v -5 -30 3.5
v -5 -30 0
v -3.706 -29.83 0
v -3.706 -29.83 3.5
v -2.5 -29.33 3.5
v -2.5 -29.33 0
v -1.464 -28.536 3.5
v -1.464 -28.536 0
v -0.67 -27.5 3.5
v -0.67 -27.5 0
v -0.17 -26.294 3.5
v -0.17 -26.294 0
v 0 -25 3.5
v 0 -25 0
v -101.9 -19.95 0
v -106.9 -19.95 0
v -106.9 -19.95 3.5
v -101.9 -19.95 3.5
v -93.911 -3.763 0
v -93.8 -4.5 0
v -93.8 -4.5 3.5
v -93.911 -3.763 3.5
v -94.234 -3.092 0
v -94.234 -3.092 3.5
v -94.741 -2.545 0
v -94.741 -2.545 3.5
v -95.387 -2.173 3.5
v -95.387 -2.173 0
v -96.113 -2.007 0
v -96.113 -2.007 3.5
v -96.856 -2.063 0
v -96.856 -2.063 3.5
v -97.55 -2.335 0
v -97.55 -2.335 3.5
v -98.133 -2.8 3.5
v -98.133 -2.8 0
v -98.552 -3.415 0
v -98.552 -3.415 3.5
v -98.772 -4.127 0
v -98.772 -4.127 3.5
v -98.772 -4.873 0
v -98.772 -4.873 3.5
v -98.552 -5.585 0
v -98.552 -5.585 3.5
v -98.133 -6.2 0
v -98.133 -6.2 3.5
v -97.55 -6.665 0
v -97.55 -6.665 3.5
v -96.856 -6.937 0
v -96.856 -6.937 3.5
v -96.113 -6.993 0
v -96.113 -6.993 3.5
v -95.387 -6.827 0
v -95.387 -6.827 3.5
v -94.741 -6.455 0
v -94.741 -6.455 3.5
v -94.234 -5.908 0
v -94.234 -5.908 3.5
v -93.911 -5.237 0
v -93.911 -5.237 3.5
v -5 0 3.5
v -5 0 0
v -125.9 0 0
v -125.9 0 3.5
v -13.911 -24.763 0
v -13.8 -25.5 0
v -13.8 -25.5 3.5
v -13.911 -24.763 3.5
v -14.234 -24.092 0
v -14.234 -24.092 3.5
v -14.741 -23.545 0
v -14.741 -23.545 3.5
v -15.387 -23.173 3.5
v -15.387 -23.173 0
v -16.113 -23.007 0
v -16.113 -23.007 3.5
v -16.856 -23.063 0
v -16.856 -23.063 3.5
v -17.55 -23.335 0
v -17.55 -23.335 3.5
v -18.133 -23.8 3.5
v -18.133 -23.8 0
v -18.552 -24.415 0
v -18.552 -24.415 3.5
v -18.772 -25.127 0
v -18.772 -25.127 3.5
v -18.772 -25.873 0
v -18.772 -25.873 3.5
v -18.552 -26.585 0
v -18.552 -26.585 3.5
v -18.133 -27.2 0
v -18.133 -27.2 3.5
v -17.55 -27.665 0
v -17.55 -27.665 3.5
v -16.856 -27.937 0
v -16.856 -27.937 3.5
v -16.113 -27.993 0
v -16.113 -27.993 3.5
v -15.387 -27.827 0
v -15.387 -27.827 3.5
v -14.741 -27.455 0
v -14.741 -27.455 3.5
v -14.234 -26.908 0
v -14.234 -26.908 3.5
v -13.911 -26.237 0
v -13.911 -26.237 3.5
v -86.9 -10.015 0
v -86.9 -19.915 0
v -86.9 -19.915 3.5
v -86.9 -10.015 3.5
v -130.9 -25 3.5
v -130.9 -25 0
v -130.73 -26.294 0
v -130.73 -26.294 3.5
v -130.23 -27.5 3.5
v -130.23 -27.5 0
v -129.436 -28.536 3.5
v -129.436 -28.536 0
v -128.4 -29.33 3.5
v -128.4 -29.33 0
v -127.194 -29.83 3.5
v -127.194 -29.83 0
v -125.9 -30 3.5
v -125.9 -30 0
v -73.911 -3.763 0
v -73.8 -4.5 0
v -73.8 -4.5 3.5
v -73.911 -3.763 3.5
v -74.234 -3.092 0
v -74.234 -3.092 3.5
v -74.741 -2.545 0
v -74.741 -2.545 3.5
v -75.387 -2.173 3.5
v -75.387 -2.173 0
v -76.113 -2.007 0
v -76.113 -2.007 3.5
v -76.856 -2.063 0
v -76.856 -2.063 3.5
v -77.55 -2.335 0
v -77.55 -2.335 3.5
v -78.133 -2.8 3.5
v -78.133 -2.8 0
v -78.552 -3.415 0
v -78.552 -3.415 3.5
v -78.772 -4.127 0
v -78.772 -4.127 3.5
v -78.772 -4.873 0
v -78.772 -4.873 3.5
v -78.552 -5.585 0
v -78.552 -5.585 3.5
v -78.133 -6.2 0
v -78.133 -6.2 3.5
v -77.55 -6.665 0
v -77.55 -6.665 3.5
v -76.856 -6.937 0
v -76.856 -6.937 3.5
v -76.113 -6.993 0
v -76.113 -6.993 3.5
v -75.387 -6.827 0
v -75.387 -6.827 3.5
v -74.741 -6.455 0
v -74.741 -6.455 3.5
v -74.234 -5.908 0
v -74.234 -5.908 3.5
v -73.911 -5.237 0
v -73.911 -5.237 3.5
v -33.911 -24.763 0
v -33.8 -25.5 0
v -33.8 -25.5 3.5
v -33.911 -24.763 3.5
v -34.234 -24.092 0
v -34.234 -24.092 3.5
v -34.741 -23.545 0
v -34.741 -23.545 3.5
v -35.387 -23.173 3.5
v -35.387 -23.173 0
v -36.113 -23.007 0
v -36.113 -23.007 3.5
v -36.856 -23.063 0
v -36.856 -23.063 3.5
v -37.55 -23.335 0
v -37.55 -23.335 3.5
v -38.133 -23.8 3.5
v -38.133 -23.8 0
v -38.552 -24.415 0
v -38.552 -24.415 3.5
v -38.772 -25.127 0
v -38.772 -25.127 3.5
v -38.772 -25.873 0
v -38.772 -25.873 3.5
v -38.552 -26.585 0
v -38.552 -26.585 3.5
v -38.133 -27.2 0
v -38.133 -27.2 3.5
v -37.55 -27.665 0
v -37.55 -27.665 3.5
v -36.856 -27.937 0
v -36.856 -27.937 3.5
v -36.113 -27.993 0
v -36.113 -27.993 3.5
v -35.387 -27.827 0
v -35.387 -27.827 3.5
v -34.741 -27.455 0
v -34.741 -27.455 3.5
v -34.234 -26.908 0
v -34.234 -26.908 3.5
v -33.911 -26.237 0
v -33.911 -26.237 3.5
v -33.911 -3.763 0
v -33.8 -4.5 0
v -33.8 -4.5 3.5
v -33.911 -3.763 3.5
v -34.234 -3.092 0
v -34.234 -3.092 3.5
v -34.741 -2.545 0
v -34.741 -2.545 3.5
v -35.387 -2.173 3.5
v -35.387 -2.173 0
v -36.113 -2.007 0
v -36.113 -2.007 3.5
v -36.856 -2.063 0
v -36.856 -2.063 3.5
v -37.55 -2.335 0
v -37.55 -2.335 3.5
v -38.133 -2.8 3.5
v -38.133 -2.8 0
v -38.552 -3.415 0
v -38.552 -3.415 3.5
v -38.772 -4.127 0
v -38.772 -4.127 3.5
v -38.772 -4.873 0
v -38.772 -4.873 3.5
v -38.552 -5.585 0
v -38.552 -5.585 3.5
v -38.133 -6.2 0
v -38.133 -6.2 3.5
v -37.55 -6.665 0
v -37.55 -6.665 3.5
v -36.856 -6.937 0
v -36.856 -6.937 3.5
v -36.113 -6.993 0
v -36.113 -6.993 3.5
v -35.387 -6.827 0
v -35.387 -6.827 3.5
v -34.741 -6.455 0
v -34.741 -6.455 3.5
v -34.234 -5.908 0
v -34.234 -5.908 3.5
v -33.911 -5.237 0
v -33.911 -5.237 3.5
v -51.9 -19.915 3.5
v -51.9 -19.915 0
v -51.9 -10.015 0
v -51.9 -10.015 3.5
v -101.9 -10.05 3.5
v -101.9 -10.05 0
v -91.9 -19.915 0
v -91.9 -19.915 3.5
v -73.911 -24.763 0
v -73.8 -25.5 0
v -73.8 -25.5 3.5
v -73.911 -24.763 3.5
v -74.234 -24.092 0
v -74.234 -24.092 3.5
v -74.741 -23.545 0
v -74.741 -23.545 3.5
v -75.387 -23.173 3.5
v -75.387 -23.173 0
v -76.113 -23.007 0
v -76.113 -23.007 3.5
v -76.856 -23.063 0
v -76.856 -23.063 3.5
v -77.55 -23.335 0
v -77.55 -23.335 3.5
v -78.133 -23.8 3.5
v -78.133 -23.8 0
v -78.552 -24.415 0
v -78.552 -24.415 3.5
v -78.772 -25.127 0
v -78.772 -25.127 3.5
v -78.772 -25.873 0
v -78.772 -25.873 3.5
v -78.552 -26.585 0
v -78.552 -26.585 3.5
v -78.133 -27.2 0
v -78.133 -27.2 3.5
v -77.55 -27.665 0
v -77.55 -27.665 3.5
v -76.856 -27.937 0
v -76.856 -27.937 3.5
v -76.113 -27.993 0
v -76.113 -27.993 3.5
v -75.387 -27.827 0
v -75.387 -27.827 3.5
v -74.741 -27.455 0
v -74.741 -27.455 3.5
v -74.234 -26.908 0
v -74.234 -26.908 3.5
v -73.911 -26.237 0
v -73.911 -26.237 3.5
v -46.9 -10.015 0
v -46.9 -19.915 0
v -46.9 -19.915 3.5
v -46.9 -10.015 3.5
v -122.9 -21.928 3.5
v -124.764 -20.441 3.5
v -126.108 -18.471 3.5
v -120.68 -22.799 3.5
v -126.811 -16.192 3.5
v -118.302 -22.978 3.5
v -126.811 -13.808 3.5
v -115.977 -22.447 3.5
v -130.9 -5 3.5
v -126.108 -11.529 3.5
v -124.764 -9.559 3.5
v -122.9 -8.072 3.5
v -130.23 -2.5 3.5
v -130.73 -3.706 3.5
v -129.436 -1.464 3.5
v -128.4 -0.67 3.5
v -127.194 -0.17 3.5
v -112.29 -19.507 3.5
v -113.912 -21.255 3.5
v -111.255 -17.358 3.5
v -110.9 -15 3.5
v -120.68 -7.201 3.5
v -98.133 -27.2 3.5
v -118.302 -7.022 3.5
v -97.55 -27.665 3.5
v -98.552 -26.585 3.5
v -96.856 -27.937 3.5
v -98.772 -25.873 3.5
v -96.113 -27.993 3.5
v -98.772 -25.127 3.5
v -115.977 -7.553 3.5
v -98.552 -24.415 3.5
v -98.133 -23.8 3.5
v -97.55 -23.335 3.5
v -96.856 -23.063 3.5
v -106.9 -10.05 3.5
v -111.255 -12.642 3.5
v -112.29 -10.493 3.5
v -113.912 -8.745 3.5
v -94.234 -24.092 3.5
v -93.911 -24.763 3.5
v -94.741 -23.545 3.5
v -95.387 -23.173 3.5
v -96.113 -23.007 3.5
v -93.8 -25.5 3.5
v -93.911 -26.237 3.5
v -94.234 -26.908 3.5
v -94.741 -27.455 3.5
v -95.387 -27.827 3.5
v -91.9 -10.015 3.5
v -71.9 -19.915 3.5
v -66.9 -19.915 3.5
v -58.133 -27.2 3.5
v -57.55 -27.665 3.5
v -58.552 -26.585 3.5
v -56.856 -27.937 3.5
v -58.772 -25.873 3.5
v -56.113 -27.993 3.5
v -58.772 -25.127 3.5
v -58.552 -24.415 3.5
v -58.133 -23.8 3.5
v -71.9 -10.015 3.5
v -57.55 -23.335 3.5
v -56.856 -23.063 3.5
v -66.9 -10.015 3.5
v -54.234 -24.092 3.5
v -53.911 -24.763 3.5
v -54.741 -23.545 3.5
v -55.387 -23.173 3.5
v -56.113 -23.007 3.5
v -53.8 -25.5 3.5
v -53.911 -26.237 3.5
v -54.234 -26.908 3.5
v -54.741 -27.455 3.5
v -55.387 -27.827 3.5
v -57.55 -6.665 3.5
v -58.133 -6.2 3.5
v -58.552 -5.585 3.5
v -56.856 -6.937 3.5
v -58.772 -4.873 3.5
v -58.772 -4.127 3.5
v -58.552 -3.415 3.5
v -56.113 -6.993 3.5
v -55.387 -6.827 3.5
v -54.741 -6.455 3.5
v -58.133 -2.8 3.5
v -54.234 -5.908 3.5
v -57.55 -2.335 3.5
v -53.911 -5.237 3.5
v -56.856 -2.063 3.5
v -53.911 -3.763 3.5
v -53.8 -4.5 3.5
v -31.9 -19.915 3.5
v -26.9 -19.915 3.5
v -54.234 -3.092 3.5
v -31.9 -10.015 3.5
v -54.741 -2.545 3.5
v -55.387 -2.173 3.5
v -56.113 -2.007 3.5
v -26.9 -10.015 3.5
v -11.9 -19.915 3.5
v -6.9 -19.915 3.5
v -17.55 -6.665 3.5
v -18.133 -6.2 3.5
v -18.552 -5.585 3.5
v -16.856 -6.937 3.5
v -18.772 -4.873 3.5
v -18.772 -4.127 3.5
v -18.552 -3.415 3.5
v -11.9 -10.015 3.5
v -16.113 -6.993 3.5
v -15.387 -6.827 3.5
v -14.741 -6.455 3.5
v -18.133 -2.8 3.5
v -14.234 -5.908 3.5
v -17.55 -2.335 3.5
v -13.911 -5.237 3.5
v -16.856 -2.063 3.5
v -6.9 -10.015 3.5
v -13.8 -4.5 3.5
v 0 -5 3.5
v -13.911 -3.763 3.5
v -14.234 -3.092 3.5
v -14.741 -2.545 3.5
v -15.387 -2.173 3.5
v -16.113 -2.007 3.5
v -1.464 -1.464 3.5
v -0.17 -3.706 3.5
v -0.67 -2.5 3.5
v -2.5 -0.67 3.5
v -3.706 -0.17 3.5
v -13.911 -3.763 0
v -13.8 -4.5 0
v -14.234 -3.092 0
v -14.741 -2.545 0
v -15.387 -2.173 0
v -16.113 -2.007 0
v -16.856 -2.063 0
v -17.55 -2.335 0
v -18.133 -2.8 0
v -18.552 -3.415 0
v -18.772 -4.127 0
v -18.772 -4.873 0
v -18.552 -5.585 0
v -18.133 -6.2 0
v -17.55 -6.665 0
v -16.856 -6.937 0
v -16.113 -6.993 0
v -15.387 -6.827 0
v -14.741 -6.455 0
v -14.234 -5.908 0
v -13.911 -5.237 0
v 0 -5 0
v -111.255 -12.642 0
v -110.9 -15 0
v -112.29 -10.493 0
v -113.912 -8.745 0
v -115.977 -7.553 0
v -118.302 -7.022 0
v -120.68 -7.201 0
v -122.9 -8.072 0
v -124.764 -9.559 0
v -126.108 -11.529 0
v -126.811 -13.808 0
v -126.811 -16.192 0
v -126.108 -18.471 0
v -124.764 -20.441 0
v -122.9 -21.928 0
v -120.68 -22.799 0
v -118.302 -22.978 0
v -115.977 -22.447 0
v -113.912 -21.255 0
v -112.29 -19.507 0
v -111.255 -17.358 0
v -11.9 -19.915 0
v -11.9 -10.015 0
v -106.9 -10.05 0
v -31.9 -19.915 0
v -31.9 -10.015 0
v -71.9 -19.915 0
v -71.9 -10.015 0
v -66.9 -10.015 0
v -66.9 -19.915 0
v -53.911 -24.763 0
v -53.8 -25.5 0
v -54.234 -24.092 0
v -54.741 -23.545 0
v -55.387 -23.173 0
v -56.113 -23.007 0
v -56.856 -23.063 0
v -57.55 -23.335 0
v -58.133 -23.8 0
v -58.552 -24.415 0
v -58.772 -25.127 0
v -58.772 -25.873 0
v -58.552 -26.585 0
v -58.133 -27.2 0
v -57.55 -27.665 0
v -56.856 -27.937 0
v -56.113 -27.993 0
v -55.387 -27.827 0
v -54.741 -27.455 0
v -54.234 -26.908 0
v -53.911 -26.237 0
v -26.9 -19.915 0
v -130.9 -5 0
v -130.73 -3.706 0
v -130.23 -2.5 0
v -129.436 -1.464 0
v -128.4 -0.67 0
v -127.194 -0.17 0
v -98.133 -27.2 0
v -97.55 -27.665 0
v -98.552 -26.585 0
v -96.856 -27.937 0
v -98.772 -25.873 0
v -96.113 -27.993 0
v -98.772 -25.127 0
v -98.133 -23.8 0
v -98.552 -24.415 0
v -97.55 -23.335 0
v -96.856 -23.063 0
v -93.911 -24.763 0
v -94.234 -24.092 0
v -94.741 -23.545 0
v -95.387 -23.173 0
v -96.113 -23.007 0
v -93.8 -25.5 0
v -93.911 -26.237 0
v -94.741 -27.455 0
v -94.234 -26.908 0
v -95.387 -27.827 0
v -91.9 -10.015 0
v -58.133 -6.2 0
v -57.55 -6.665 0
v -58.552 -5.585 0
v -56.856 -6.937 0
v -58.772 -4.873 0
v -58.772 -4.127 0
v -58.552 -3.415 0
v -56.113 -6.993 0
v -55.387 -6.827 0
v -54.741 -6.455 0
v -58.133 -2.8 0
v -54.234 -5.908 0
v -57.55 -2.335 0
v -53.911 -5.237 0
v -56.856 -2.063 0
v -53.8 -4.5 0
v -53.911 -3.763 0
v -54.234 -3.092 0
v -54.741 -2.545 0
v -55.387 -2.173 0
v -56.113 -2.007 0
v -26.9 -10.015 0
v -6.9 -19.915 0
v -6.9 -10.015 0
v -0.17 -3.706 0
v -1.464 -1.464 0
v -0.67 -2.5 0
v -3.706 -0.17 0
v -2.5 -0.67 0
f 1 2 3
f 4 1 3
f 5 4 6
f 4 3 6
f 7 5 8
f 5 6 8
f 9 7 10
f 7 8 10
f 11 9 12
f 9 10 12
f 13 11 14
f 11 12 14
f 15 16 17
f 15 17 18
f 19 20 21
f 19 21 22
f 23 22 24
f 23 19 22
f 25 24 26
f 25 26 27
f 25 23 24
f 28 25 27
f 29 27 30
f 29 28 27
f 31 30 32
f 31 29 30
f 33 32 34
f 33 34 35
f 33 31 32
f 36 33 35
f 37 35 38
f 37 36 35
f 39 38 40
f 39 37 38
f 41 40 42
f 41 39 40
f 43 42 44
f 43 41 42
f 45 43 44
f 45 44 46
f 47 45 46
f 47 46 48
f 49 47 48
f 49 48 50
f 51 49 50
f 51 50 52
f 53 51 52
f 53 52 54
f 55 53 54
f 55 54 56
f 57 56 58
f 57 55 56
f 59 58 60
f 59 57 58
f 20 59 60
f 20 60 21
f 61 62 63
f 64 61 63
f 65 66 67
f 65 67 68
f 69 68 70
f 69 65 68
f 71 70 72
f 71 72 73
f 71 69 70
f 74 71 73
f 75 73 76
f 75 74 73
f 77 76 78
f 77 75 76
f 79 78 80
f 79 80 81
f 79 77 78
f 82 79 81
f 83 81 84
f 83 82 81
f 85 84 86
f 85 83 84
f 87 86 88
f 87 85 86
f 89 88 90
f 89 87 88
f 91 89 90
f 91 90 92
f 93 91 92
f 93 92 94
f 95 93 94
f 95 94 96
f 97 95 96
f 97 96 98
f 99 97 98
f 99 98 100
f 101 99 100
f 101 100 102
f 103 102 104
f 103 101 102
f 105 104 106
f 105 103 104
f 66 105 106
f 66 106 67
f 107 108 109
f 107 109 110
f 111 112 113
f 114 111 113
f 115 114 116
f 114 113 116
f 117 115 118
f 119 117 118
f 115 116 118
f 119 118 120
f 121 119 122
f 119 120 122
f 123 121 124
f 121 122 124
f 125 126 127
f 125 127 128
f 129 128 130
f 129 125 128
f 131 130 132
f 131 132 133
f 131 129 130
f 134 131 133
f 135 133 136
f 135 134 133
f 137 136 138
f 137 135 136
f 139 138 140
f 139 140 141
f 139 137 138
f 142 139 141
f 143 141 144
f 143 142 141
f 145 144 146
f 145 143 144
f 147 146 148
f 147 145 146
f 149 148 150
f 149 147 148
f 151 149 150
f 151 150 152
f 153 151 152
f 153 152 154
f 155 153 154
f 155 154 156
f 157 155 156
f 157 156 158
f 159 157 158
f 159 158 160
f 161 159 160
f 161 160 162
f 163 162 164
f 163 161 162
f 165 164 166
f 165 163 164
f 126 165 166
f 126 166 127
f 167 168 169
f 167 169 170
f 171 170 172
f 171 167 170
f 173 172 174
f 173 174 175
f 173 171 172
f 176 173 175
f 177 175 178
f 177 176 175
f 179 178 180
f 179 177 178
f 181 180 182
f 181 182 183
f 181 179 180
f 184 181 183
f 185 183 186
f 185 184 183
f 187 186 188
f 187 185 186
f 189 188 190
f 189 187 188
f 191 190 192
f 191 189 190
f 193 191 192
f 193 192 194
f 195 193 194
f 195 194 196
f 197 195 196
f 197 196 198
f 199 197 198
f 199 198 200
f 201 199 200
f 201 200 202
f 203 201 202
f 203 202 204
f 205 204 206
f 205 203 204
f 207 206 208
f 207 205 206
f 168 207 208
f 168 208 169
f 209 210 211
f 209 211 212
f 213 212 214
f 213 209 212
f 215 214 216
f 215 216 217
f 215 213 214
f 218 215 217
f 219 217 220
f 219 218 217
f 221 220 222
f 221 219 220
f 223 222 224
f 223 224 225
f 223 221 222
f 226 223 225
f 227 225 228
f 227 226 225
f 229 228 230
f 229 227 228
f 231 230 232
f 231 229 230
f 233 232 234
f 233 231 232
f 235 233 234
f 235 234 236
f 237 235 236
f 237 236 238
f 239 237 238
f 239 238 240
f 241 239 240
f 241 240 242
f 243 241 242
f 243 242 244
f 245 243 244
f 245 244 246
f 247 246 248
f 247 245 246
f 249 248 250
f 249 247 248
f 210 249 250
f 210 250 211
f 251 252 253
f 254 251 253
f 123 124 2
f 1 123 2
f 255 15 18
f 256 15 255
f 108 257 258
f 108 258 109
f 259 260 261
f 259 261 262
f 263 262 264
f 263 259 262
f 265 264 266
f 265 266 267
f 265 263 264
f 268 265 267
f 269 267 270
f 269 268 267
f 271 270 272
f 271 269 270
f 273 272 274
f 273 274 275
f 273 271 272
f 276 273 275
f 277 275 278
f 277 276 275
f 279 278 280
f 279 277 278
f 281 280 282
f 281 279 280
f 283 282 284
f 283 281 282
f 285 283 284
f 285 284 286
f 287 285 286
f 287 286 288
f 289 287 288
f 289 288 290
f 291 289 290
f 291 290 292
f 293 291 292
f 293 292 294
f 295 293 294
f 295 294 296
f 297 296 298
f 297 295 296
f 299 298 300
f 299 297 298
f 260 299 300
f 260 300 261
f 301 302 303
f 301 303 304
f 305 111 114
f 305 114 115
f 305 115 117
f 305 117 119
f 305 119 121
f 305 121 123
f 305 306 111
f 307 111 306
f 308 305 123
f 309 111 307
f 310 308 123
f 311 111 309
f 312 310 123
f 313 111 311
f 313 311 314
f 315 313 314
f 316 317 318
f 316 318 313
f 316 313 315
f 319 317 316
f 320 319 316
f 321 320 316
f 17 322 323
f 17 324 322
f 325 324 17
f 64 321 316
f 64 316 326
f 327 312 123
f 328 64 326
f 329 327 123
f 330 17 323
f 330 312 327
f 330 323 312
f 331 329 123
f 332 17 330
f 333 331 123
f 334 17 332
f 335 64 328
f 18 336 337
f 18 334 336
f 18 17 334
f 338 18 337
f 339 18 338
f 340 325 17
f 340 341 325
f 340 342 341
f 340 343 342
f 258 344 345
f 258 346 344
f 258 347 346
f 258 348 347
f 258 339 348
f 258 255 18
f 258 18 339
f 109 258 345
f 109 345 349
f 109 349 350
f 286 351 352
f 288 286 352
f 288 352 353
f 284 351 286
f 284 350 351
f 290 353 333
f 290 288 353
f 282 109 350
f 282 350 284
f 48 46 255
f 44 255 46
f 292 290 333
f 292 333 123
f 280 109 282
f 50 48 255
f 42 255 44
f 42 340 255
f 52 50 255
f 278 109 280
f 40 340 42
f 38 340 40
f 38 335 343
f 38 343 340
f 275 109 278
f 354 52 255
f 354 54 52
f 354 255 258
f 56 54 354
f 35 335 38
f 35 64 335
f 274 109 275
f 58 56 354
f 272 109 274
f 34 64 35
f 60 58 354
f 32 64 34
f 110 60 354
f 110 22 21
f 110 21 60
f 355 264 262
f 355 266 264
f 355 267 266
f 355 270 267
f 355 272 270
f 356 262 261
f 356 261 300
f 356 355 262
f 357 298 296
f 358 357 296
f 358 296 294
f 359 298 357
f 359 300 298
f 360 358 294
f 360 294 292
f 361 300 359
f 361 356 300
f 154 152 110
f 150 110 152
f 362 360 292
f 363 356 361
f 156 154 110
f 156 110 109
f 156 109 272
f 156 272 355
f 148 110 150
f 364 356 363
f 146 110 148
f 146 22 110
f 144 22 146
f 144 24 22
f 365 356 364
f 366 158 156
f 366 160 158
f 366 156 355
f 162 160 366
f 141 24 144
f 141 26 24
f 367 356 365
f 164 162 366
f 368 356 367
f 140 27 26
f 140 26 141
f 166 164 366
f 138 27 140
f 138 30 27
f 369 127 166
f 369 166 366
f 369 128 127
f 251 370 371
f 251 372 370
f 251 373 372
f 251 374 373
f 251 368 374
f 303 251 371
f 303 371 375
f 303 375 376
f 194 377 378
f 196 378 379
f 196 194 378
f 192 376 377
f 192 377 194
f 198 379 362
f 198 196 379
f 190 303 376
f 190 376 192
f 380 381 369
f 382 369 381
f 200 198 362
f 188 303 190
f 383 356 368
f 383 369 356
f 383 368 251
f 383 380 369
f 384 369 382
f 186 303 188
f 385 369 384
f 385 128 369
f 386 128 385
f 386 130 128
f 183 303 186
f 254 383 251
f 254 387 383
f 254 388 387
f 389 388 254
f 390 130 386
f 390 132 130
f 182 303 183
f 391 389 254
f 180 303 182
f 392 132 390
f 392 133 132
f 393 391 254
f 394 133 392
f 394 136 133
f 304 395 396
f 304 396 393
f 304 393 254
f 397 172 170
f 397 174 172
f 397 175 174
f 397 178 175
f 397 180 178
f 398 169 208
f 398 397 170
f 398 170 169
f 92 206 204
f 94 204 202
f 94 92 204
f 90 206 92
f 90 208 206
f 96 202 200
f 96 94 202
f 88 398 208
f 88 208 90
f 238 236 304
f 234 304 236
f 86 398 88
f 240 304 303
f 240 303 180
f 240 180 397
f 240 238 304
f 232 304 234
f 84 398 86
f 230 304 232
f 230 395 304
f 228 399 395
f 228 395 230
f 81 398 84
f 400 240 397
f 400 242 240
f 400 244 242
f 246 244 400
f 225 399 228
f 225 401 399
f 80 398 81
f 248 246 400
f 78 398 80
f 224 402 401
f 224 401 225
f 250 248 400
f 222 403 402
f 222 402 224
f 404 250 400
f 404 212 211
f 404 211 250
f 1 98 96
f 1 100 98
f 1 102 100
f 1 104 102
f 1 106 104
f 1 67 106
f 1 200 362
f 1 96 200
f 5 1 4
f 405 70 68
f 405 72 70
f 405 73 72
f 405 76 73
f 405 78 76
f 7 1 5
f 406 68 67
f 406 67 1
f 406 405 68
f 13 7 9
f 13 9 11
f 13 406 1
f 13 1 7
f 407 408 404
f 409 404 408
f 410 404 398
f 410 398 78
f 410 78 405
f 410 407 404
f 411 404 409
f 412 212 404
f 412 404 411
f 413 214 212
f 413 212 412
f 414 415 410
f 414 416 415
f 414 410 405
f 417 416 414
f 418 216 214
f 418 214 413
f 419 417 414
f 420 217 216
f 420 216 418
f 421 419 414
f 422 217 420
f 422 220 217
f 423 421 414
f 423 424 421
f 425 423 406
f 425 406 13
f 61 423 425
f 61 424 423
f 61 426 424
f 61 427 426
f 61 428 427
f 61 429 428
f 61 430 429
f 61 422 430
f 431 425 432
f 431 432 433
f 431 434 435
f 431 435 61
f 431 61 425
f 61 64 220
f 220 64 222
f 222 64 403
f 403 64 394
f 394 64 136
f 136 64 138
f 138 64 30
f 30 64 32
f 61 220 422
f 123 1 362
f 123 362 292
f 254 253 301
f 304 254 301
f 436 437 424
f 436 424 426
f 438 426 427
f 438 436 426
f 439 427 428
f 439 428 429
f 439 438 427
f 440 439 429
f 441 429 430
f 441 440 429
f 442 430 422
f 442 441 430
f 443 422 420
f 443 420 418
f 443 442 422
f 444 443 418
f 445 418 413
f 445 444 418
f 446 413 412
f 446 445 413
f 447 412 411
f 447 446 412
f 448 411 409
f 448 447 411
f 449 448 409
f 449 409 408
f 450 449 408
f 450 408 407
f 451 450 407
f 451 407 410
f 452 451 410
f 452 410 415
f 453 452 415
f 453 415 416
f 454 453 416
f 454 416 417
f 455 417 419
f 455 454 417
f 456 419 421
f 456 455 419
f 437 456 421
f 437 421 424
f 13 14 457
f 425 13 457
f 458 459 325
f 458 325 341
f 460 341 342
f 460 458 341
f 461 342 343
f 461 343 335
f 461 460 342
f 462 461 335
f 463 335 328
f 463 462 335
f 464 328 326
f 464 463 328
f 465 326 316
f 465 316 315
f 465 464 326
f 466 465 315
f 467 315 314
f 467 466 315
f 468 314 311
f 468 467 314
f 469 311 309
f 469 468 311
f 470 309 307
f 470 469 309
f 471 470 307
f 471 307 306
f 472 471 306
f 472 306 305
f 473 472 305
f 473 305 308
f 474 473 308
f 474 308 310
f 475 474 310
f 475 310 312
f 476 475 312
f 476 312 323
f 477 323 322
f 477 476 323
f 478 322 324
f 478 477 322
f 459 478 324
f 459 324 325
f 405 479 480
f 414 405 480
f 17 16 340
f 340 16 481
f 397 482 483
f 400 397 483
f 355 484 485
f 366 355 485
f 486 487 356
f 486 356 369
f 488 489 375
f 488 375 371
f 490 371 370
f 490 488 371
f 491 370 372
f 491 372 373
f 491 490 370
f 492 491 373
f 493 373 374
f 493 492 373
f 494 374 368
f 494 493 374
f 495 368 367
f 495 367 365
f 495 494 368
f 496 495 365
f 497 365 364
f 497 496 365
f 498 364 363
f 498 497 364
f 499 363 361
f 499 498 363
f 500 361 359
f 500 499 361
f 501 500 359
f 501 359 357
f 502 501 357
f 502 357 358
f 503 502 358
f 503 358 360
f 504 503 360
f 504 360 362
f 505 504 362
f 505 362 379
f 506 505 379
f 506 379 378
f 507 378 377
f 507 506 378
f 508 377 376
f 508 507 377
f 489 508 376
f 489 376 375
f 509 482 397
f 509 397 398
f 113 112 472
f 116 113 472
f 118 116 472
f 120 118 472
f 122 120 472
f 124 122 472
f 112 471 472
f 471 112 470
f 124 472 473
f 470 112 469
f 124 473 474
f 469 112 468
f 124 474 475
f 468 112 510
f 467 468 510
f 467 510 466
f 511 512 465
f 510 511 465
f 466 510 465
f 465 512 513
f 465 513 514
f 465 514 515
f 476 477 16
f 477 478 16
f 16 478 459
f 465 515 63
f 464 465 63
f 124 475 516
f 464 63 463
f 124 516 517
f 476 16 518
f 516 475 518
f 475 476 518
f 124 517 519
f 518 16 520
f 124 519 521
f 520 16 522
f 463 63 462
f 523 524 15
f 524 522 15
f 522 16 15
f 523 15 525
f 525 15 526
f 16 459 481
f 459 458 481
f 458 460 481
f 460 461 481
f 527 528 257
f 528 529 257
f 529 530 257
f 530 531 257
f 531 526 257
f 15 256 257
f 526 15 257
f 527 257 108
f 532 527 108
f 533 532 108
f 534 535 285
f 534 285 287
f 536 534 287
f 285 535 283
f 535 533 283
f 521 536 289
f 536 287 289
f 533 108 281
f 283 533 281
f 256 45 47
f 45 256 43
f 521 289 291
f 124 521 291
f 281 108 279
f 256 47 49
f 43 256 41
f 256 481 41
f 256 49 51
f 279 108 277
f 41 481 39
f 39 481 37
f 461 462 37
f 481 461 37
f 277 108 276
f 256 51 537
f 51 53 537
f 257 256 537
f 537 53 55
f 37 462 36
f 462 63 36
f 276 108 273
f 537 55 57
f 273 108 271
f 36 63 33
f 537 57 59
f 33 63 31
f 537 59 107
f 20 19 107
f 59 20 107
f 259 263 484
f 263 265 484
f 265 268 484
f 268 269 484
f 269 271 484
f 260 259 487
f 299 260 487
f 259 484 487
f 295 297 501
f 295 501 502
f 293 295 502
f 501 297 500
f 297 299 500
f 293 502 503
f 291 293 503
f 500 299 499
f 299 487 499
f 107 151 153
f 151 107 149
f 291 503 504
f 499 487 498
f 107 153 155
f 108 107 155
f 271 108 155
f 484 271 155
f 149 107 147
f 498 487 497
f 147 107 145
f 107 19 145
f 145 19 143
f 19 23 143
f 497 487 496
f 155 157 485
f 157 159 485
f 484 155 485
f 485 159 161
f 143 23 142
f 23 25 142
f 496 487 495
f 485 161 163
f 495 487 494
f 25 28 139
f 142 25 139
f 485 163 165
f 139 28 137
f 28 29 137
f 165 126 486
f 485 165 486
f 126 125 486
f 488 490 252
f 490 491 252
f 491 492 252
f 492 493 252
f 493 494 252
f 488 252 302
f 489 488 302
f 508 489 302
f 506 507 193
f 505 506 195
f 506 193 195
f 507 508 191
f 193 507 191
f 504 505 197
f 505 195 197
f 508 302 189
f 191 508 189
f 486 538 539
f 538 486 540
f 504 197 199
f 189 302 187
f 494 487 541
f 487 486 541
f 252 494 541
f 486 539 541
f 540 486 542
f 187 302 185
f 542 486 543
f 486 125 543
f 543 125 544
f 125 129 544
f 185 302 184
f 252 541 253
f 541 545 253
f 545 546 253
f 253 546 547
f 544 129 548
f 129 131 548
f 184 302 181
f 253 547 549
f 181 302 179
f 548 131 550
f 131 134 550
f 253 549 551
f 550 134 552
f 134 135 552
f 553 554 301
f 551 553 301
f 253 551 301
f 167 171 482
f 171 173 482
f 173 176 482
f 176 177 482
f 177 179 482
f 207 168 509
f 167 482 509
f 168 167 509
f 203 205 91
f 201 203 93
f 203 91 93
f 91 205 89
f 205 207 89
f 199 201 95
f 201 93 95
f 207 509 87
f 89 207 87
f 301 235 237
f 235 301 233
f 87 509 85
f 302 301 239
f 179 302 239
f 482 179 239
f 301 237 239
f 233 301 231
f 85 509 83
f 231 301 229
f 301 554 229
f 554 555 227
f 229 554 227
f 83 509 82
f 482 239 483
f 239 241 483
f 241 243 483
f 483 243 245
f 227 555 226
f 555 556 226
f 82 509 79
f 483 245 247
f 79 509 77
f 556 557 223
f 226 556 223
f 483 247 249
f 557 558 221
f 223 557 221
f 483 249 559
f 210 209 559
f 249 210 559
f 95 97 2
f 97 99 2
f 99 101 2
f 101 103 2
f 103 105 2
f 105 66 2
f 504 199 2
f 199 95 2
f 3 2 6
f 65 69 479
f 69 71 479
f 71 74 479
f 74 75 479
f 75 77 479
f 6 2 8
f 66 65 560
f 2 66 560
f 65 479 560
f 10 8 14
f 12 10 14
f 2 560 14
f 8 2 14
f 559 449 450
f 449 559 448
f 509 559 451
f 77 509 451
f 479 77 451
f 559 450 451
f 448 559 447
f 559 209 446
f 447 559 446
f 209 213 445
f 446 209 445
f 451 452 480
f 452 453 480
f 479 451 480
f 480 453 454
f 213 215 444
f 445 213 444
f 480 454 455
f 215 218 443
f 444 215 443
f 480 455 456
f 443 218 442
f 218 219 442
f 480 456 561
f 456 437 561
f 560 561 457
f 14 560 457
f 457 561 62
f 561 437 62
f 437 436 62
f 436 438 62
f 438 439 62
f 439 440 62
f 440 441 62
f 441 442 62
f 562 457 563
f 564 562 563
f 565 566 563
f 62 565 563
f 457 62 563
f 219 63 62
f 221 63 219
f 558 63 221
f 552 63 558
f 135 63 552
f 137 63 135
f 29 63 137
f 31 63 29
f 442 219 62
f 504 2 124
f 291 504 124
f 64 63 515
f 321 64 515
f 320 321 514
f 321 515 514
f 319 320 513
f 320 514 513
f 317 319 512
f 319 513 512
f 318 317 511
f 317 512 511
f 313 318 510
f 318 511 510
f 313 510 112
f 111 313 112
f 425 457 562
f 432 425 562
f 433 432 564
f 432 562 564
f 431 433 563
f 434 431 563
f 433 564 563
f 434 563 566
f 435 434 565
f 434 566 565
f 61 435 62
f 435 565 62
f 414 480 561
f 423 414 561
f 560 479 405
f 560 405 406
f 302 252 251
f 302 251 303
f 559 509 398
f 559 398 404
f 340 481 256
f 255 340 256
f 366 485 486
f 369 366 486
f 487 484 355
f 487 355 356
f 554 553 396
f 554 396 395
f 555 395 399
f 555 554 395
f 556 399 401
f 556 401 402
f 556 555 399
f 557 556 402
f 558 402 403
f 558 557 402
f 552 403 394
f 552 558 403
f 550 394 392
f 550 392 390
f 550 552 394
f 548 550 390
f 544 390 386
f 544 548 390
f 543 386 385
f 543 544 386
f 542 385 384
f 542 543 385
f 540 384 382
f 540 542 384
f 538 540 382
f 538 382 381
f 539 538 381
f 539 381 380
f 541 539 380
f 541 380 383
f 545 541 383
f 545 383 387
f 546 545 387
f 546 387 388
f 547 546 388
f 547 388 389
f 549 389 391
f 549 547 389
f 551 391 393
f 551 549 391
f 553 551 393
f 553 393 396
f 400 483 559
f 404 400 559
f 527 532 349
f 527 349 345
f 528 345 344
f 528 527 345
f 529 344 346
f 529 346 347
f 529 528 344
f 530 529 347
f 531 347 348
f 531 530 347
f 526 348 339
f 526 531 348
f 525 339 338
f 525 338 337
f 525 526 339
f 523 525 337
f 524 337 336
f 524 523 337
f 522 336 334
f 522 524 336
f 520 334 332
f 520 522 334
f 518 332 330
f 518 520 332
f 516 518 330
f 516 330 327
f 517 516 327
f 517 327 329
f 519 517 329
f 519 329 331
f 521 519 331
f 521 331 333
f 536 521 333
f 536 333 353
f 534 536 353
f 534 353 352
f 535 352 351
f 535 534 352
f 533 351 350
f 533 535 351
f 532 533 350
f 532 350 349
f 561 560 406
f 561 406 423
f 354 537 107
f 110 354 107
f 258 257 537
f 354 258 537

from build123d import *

# Parameters (mm, degrees)
F0_R     = 2.5
F0_R_2   = 8
F0_W     = 5
F0_H     = 9.9
F1_DEPTH = 3.5


with BuildPart() as f1:
    # F0 (on Top) → F1 (new body)
    with BuildSketch(Plane.XY):
        with BuildLine():
            ThreePointArc((0, -5), (-1.464466, -1.464466), (-5, 0))
            Line((-5, 0), (-125.9, 0))
            ThreePointArc((-125.9, 0), (-129.435534, -1.464466), (-130.9, -5))
            Line((-130.9, -5), (-130.9, -25))
            ThreePointArc((-130.9, -25), (-129.435534, -28.535534), (-125.9, -30))
            Line((-125.9, -30), (-5, -30))
            ThreePointArc((-5, -30), (-1.464466, -28.535534), (0, -25))
            Line((0, -25), (0, -5))
        make_face()
        with Locations((-96.3, -25.5)):
            Circle(F0_R, mode=Mode.SUBTRACT)
        with Locations((-76.3, -25.5)):
            Circle(F0_R, mode=Mode.SUBTRACT)
        with Locations((-56.3, -25.5)):
            Circle(F0_R, mode=Mode.SUBTRACT)
        with Locations((-36.3, -25.5)):
            Circle(F0_R, mode=Mode.SUBTRACT)
        with Locations((-16.3, -25.5)):
            Circle(F0_R, mode=Mode.SUBTRACT)
        with Locations((-118.9, -15)):
            Circle(F0_R_2, mode=Mode.SUBTRACT)
        with Locations((-104.4, -15)):
            Rectangle(F0_W, F0_H, mode=Mode.SUBTRACT)
        with Locations((-89.4, -14.965372)):
            Rectangle(F0_W, F0_H, mode=Mode.SUBTRACT)
        with Locations((-69.4, -14.965372)):
            Rectangle(F0_W, F0_H, mode=Mode.SUBTRACT)
        with Locations((-96.3, -4.5)):
            Circle(F0_R, mode=Mode.SUBTRACT)
        with Locations((-76.3, -4.5)):
            Circle(F0_R, mode=Mode.SUBTRACT)
        with Locations((-49.4, -14.965372)):
            Rectangle(F0_W, F0_H, mode=Mode.SUBTRACT)
        with Locations((-29.4, -14.965372)):
            Rectangle(F0_W, F0_H, mode=Mode.SUBTRACT)
        with Locations((-9.4, -14.965372)):
            Rectangle(F0_W, F0_H, mode=Mode.SUBTRACT)
        with Locations((-56.3, -4.5)):
            Circle(F0_R, mode=Mode.SUBTRACT)
        with Locations((-36.3, -4.5)):
            Circle(F0_R, mode=Mode.SUBTRACT)
        with Locations((-16.3, -4.5)):
            Circle(F0_R, mode=Mode.SUBTRACT)
    extrude(amount=F1_DEPTH)


solid = f1.part
